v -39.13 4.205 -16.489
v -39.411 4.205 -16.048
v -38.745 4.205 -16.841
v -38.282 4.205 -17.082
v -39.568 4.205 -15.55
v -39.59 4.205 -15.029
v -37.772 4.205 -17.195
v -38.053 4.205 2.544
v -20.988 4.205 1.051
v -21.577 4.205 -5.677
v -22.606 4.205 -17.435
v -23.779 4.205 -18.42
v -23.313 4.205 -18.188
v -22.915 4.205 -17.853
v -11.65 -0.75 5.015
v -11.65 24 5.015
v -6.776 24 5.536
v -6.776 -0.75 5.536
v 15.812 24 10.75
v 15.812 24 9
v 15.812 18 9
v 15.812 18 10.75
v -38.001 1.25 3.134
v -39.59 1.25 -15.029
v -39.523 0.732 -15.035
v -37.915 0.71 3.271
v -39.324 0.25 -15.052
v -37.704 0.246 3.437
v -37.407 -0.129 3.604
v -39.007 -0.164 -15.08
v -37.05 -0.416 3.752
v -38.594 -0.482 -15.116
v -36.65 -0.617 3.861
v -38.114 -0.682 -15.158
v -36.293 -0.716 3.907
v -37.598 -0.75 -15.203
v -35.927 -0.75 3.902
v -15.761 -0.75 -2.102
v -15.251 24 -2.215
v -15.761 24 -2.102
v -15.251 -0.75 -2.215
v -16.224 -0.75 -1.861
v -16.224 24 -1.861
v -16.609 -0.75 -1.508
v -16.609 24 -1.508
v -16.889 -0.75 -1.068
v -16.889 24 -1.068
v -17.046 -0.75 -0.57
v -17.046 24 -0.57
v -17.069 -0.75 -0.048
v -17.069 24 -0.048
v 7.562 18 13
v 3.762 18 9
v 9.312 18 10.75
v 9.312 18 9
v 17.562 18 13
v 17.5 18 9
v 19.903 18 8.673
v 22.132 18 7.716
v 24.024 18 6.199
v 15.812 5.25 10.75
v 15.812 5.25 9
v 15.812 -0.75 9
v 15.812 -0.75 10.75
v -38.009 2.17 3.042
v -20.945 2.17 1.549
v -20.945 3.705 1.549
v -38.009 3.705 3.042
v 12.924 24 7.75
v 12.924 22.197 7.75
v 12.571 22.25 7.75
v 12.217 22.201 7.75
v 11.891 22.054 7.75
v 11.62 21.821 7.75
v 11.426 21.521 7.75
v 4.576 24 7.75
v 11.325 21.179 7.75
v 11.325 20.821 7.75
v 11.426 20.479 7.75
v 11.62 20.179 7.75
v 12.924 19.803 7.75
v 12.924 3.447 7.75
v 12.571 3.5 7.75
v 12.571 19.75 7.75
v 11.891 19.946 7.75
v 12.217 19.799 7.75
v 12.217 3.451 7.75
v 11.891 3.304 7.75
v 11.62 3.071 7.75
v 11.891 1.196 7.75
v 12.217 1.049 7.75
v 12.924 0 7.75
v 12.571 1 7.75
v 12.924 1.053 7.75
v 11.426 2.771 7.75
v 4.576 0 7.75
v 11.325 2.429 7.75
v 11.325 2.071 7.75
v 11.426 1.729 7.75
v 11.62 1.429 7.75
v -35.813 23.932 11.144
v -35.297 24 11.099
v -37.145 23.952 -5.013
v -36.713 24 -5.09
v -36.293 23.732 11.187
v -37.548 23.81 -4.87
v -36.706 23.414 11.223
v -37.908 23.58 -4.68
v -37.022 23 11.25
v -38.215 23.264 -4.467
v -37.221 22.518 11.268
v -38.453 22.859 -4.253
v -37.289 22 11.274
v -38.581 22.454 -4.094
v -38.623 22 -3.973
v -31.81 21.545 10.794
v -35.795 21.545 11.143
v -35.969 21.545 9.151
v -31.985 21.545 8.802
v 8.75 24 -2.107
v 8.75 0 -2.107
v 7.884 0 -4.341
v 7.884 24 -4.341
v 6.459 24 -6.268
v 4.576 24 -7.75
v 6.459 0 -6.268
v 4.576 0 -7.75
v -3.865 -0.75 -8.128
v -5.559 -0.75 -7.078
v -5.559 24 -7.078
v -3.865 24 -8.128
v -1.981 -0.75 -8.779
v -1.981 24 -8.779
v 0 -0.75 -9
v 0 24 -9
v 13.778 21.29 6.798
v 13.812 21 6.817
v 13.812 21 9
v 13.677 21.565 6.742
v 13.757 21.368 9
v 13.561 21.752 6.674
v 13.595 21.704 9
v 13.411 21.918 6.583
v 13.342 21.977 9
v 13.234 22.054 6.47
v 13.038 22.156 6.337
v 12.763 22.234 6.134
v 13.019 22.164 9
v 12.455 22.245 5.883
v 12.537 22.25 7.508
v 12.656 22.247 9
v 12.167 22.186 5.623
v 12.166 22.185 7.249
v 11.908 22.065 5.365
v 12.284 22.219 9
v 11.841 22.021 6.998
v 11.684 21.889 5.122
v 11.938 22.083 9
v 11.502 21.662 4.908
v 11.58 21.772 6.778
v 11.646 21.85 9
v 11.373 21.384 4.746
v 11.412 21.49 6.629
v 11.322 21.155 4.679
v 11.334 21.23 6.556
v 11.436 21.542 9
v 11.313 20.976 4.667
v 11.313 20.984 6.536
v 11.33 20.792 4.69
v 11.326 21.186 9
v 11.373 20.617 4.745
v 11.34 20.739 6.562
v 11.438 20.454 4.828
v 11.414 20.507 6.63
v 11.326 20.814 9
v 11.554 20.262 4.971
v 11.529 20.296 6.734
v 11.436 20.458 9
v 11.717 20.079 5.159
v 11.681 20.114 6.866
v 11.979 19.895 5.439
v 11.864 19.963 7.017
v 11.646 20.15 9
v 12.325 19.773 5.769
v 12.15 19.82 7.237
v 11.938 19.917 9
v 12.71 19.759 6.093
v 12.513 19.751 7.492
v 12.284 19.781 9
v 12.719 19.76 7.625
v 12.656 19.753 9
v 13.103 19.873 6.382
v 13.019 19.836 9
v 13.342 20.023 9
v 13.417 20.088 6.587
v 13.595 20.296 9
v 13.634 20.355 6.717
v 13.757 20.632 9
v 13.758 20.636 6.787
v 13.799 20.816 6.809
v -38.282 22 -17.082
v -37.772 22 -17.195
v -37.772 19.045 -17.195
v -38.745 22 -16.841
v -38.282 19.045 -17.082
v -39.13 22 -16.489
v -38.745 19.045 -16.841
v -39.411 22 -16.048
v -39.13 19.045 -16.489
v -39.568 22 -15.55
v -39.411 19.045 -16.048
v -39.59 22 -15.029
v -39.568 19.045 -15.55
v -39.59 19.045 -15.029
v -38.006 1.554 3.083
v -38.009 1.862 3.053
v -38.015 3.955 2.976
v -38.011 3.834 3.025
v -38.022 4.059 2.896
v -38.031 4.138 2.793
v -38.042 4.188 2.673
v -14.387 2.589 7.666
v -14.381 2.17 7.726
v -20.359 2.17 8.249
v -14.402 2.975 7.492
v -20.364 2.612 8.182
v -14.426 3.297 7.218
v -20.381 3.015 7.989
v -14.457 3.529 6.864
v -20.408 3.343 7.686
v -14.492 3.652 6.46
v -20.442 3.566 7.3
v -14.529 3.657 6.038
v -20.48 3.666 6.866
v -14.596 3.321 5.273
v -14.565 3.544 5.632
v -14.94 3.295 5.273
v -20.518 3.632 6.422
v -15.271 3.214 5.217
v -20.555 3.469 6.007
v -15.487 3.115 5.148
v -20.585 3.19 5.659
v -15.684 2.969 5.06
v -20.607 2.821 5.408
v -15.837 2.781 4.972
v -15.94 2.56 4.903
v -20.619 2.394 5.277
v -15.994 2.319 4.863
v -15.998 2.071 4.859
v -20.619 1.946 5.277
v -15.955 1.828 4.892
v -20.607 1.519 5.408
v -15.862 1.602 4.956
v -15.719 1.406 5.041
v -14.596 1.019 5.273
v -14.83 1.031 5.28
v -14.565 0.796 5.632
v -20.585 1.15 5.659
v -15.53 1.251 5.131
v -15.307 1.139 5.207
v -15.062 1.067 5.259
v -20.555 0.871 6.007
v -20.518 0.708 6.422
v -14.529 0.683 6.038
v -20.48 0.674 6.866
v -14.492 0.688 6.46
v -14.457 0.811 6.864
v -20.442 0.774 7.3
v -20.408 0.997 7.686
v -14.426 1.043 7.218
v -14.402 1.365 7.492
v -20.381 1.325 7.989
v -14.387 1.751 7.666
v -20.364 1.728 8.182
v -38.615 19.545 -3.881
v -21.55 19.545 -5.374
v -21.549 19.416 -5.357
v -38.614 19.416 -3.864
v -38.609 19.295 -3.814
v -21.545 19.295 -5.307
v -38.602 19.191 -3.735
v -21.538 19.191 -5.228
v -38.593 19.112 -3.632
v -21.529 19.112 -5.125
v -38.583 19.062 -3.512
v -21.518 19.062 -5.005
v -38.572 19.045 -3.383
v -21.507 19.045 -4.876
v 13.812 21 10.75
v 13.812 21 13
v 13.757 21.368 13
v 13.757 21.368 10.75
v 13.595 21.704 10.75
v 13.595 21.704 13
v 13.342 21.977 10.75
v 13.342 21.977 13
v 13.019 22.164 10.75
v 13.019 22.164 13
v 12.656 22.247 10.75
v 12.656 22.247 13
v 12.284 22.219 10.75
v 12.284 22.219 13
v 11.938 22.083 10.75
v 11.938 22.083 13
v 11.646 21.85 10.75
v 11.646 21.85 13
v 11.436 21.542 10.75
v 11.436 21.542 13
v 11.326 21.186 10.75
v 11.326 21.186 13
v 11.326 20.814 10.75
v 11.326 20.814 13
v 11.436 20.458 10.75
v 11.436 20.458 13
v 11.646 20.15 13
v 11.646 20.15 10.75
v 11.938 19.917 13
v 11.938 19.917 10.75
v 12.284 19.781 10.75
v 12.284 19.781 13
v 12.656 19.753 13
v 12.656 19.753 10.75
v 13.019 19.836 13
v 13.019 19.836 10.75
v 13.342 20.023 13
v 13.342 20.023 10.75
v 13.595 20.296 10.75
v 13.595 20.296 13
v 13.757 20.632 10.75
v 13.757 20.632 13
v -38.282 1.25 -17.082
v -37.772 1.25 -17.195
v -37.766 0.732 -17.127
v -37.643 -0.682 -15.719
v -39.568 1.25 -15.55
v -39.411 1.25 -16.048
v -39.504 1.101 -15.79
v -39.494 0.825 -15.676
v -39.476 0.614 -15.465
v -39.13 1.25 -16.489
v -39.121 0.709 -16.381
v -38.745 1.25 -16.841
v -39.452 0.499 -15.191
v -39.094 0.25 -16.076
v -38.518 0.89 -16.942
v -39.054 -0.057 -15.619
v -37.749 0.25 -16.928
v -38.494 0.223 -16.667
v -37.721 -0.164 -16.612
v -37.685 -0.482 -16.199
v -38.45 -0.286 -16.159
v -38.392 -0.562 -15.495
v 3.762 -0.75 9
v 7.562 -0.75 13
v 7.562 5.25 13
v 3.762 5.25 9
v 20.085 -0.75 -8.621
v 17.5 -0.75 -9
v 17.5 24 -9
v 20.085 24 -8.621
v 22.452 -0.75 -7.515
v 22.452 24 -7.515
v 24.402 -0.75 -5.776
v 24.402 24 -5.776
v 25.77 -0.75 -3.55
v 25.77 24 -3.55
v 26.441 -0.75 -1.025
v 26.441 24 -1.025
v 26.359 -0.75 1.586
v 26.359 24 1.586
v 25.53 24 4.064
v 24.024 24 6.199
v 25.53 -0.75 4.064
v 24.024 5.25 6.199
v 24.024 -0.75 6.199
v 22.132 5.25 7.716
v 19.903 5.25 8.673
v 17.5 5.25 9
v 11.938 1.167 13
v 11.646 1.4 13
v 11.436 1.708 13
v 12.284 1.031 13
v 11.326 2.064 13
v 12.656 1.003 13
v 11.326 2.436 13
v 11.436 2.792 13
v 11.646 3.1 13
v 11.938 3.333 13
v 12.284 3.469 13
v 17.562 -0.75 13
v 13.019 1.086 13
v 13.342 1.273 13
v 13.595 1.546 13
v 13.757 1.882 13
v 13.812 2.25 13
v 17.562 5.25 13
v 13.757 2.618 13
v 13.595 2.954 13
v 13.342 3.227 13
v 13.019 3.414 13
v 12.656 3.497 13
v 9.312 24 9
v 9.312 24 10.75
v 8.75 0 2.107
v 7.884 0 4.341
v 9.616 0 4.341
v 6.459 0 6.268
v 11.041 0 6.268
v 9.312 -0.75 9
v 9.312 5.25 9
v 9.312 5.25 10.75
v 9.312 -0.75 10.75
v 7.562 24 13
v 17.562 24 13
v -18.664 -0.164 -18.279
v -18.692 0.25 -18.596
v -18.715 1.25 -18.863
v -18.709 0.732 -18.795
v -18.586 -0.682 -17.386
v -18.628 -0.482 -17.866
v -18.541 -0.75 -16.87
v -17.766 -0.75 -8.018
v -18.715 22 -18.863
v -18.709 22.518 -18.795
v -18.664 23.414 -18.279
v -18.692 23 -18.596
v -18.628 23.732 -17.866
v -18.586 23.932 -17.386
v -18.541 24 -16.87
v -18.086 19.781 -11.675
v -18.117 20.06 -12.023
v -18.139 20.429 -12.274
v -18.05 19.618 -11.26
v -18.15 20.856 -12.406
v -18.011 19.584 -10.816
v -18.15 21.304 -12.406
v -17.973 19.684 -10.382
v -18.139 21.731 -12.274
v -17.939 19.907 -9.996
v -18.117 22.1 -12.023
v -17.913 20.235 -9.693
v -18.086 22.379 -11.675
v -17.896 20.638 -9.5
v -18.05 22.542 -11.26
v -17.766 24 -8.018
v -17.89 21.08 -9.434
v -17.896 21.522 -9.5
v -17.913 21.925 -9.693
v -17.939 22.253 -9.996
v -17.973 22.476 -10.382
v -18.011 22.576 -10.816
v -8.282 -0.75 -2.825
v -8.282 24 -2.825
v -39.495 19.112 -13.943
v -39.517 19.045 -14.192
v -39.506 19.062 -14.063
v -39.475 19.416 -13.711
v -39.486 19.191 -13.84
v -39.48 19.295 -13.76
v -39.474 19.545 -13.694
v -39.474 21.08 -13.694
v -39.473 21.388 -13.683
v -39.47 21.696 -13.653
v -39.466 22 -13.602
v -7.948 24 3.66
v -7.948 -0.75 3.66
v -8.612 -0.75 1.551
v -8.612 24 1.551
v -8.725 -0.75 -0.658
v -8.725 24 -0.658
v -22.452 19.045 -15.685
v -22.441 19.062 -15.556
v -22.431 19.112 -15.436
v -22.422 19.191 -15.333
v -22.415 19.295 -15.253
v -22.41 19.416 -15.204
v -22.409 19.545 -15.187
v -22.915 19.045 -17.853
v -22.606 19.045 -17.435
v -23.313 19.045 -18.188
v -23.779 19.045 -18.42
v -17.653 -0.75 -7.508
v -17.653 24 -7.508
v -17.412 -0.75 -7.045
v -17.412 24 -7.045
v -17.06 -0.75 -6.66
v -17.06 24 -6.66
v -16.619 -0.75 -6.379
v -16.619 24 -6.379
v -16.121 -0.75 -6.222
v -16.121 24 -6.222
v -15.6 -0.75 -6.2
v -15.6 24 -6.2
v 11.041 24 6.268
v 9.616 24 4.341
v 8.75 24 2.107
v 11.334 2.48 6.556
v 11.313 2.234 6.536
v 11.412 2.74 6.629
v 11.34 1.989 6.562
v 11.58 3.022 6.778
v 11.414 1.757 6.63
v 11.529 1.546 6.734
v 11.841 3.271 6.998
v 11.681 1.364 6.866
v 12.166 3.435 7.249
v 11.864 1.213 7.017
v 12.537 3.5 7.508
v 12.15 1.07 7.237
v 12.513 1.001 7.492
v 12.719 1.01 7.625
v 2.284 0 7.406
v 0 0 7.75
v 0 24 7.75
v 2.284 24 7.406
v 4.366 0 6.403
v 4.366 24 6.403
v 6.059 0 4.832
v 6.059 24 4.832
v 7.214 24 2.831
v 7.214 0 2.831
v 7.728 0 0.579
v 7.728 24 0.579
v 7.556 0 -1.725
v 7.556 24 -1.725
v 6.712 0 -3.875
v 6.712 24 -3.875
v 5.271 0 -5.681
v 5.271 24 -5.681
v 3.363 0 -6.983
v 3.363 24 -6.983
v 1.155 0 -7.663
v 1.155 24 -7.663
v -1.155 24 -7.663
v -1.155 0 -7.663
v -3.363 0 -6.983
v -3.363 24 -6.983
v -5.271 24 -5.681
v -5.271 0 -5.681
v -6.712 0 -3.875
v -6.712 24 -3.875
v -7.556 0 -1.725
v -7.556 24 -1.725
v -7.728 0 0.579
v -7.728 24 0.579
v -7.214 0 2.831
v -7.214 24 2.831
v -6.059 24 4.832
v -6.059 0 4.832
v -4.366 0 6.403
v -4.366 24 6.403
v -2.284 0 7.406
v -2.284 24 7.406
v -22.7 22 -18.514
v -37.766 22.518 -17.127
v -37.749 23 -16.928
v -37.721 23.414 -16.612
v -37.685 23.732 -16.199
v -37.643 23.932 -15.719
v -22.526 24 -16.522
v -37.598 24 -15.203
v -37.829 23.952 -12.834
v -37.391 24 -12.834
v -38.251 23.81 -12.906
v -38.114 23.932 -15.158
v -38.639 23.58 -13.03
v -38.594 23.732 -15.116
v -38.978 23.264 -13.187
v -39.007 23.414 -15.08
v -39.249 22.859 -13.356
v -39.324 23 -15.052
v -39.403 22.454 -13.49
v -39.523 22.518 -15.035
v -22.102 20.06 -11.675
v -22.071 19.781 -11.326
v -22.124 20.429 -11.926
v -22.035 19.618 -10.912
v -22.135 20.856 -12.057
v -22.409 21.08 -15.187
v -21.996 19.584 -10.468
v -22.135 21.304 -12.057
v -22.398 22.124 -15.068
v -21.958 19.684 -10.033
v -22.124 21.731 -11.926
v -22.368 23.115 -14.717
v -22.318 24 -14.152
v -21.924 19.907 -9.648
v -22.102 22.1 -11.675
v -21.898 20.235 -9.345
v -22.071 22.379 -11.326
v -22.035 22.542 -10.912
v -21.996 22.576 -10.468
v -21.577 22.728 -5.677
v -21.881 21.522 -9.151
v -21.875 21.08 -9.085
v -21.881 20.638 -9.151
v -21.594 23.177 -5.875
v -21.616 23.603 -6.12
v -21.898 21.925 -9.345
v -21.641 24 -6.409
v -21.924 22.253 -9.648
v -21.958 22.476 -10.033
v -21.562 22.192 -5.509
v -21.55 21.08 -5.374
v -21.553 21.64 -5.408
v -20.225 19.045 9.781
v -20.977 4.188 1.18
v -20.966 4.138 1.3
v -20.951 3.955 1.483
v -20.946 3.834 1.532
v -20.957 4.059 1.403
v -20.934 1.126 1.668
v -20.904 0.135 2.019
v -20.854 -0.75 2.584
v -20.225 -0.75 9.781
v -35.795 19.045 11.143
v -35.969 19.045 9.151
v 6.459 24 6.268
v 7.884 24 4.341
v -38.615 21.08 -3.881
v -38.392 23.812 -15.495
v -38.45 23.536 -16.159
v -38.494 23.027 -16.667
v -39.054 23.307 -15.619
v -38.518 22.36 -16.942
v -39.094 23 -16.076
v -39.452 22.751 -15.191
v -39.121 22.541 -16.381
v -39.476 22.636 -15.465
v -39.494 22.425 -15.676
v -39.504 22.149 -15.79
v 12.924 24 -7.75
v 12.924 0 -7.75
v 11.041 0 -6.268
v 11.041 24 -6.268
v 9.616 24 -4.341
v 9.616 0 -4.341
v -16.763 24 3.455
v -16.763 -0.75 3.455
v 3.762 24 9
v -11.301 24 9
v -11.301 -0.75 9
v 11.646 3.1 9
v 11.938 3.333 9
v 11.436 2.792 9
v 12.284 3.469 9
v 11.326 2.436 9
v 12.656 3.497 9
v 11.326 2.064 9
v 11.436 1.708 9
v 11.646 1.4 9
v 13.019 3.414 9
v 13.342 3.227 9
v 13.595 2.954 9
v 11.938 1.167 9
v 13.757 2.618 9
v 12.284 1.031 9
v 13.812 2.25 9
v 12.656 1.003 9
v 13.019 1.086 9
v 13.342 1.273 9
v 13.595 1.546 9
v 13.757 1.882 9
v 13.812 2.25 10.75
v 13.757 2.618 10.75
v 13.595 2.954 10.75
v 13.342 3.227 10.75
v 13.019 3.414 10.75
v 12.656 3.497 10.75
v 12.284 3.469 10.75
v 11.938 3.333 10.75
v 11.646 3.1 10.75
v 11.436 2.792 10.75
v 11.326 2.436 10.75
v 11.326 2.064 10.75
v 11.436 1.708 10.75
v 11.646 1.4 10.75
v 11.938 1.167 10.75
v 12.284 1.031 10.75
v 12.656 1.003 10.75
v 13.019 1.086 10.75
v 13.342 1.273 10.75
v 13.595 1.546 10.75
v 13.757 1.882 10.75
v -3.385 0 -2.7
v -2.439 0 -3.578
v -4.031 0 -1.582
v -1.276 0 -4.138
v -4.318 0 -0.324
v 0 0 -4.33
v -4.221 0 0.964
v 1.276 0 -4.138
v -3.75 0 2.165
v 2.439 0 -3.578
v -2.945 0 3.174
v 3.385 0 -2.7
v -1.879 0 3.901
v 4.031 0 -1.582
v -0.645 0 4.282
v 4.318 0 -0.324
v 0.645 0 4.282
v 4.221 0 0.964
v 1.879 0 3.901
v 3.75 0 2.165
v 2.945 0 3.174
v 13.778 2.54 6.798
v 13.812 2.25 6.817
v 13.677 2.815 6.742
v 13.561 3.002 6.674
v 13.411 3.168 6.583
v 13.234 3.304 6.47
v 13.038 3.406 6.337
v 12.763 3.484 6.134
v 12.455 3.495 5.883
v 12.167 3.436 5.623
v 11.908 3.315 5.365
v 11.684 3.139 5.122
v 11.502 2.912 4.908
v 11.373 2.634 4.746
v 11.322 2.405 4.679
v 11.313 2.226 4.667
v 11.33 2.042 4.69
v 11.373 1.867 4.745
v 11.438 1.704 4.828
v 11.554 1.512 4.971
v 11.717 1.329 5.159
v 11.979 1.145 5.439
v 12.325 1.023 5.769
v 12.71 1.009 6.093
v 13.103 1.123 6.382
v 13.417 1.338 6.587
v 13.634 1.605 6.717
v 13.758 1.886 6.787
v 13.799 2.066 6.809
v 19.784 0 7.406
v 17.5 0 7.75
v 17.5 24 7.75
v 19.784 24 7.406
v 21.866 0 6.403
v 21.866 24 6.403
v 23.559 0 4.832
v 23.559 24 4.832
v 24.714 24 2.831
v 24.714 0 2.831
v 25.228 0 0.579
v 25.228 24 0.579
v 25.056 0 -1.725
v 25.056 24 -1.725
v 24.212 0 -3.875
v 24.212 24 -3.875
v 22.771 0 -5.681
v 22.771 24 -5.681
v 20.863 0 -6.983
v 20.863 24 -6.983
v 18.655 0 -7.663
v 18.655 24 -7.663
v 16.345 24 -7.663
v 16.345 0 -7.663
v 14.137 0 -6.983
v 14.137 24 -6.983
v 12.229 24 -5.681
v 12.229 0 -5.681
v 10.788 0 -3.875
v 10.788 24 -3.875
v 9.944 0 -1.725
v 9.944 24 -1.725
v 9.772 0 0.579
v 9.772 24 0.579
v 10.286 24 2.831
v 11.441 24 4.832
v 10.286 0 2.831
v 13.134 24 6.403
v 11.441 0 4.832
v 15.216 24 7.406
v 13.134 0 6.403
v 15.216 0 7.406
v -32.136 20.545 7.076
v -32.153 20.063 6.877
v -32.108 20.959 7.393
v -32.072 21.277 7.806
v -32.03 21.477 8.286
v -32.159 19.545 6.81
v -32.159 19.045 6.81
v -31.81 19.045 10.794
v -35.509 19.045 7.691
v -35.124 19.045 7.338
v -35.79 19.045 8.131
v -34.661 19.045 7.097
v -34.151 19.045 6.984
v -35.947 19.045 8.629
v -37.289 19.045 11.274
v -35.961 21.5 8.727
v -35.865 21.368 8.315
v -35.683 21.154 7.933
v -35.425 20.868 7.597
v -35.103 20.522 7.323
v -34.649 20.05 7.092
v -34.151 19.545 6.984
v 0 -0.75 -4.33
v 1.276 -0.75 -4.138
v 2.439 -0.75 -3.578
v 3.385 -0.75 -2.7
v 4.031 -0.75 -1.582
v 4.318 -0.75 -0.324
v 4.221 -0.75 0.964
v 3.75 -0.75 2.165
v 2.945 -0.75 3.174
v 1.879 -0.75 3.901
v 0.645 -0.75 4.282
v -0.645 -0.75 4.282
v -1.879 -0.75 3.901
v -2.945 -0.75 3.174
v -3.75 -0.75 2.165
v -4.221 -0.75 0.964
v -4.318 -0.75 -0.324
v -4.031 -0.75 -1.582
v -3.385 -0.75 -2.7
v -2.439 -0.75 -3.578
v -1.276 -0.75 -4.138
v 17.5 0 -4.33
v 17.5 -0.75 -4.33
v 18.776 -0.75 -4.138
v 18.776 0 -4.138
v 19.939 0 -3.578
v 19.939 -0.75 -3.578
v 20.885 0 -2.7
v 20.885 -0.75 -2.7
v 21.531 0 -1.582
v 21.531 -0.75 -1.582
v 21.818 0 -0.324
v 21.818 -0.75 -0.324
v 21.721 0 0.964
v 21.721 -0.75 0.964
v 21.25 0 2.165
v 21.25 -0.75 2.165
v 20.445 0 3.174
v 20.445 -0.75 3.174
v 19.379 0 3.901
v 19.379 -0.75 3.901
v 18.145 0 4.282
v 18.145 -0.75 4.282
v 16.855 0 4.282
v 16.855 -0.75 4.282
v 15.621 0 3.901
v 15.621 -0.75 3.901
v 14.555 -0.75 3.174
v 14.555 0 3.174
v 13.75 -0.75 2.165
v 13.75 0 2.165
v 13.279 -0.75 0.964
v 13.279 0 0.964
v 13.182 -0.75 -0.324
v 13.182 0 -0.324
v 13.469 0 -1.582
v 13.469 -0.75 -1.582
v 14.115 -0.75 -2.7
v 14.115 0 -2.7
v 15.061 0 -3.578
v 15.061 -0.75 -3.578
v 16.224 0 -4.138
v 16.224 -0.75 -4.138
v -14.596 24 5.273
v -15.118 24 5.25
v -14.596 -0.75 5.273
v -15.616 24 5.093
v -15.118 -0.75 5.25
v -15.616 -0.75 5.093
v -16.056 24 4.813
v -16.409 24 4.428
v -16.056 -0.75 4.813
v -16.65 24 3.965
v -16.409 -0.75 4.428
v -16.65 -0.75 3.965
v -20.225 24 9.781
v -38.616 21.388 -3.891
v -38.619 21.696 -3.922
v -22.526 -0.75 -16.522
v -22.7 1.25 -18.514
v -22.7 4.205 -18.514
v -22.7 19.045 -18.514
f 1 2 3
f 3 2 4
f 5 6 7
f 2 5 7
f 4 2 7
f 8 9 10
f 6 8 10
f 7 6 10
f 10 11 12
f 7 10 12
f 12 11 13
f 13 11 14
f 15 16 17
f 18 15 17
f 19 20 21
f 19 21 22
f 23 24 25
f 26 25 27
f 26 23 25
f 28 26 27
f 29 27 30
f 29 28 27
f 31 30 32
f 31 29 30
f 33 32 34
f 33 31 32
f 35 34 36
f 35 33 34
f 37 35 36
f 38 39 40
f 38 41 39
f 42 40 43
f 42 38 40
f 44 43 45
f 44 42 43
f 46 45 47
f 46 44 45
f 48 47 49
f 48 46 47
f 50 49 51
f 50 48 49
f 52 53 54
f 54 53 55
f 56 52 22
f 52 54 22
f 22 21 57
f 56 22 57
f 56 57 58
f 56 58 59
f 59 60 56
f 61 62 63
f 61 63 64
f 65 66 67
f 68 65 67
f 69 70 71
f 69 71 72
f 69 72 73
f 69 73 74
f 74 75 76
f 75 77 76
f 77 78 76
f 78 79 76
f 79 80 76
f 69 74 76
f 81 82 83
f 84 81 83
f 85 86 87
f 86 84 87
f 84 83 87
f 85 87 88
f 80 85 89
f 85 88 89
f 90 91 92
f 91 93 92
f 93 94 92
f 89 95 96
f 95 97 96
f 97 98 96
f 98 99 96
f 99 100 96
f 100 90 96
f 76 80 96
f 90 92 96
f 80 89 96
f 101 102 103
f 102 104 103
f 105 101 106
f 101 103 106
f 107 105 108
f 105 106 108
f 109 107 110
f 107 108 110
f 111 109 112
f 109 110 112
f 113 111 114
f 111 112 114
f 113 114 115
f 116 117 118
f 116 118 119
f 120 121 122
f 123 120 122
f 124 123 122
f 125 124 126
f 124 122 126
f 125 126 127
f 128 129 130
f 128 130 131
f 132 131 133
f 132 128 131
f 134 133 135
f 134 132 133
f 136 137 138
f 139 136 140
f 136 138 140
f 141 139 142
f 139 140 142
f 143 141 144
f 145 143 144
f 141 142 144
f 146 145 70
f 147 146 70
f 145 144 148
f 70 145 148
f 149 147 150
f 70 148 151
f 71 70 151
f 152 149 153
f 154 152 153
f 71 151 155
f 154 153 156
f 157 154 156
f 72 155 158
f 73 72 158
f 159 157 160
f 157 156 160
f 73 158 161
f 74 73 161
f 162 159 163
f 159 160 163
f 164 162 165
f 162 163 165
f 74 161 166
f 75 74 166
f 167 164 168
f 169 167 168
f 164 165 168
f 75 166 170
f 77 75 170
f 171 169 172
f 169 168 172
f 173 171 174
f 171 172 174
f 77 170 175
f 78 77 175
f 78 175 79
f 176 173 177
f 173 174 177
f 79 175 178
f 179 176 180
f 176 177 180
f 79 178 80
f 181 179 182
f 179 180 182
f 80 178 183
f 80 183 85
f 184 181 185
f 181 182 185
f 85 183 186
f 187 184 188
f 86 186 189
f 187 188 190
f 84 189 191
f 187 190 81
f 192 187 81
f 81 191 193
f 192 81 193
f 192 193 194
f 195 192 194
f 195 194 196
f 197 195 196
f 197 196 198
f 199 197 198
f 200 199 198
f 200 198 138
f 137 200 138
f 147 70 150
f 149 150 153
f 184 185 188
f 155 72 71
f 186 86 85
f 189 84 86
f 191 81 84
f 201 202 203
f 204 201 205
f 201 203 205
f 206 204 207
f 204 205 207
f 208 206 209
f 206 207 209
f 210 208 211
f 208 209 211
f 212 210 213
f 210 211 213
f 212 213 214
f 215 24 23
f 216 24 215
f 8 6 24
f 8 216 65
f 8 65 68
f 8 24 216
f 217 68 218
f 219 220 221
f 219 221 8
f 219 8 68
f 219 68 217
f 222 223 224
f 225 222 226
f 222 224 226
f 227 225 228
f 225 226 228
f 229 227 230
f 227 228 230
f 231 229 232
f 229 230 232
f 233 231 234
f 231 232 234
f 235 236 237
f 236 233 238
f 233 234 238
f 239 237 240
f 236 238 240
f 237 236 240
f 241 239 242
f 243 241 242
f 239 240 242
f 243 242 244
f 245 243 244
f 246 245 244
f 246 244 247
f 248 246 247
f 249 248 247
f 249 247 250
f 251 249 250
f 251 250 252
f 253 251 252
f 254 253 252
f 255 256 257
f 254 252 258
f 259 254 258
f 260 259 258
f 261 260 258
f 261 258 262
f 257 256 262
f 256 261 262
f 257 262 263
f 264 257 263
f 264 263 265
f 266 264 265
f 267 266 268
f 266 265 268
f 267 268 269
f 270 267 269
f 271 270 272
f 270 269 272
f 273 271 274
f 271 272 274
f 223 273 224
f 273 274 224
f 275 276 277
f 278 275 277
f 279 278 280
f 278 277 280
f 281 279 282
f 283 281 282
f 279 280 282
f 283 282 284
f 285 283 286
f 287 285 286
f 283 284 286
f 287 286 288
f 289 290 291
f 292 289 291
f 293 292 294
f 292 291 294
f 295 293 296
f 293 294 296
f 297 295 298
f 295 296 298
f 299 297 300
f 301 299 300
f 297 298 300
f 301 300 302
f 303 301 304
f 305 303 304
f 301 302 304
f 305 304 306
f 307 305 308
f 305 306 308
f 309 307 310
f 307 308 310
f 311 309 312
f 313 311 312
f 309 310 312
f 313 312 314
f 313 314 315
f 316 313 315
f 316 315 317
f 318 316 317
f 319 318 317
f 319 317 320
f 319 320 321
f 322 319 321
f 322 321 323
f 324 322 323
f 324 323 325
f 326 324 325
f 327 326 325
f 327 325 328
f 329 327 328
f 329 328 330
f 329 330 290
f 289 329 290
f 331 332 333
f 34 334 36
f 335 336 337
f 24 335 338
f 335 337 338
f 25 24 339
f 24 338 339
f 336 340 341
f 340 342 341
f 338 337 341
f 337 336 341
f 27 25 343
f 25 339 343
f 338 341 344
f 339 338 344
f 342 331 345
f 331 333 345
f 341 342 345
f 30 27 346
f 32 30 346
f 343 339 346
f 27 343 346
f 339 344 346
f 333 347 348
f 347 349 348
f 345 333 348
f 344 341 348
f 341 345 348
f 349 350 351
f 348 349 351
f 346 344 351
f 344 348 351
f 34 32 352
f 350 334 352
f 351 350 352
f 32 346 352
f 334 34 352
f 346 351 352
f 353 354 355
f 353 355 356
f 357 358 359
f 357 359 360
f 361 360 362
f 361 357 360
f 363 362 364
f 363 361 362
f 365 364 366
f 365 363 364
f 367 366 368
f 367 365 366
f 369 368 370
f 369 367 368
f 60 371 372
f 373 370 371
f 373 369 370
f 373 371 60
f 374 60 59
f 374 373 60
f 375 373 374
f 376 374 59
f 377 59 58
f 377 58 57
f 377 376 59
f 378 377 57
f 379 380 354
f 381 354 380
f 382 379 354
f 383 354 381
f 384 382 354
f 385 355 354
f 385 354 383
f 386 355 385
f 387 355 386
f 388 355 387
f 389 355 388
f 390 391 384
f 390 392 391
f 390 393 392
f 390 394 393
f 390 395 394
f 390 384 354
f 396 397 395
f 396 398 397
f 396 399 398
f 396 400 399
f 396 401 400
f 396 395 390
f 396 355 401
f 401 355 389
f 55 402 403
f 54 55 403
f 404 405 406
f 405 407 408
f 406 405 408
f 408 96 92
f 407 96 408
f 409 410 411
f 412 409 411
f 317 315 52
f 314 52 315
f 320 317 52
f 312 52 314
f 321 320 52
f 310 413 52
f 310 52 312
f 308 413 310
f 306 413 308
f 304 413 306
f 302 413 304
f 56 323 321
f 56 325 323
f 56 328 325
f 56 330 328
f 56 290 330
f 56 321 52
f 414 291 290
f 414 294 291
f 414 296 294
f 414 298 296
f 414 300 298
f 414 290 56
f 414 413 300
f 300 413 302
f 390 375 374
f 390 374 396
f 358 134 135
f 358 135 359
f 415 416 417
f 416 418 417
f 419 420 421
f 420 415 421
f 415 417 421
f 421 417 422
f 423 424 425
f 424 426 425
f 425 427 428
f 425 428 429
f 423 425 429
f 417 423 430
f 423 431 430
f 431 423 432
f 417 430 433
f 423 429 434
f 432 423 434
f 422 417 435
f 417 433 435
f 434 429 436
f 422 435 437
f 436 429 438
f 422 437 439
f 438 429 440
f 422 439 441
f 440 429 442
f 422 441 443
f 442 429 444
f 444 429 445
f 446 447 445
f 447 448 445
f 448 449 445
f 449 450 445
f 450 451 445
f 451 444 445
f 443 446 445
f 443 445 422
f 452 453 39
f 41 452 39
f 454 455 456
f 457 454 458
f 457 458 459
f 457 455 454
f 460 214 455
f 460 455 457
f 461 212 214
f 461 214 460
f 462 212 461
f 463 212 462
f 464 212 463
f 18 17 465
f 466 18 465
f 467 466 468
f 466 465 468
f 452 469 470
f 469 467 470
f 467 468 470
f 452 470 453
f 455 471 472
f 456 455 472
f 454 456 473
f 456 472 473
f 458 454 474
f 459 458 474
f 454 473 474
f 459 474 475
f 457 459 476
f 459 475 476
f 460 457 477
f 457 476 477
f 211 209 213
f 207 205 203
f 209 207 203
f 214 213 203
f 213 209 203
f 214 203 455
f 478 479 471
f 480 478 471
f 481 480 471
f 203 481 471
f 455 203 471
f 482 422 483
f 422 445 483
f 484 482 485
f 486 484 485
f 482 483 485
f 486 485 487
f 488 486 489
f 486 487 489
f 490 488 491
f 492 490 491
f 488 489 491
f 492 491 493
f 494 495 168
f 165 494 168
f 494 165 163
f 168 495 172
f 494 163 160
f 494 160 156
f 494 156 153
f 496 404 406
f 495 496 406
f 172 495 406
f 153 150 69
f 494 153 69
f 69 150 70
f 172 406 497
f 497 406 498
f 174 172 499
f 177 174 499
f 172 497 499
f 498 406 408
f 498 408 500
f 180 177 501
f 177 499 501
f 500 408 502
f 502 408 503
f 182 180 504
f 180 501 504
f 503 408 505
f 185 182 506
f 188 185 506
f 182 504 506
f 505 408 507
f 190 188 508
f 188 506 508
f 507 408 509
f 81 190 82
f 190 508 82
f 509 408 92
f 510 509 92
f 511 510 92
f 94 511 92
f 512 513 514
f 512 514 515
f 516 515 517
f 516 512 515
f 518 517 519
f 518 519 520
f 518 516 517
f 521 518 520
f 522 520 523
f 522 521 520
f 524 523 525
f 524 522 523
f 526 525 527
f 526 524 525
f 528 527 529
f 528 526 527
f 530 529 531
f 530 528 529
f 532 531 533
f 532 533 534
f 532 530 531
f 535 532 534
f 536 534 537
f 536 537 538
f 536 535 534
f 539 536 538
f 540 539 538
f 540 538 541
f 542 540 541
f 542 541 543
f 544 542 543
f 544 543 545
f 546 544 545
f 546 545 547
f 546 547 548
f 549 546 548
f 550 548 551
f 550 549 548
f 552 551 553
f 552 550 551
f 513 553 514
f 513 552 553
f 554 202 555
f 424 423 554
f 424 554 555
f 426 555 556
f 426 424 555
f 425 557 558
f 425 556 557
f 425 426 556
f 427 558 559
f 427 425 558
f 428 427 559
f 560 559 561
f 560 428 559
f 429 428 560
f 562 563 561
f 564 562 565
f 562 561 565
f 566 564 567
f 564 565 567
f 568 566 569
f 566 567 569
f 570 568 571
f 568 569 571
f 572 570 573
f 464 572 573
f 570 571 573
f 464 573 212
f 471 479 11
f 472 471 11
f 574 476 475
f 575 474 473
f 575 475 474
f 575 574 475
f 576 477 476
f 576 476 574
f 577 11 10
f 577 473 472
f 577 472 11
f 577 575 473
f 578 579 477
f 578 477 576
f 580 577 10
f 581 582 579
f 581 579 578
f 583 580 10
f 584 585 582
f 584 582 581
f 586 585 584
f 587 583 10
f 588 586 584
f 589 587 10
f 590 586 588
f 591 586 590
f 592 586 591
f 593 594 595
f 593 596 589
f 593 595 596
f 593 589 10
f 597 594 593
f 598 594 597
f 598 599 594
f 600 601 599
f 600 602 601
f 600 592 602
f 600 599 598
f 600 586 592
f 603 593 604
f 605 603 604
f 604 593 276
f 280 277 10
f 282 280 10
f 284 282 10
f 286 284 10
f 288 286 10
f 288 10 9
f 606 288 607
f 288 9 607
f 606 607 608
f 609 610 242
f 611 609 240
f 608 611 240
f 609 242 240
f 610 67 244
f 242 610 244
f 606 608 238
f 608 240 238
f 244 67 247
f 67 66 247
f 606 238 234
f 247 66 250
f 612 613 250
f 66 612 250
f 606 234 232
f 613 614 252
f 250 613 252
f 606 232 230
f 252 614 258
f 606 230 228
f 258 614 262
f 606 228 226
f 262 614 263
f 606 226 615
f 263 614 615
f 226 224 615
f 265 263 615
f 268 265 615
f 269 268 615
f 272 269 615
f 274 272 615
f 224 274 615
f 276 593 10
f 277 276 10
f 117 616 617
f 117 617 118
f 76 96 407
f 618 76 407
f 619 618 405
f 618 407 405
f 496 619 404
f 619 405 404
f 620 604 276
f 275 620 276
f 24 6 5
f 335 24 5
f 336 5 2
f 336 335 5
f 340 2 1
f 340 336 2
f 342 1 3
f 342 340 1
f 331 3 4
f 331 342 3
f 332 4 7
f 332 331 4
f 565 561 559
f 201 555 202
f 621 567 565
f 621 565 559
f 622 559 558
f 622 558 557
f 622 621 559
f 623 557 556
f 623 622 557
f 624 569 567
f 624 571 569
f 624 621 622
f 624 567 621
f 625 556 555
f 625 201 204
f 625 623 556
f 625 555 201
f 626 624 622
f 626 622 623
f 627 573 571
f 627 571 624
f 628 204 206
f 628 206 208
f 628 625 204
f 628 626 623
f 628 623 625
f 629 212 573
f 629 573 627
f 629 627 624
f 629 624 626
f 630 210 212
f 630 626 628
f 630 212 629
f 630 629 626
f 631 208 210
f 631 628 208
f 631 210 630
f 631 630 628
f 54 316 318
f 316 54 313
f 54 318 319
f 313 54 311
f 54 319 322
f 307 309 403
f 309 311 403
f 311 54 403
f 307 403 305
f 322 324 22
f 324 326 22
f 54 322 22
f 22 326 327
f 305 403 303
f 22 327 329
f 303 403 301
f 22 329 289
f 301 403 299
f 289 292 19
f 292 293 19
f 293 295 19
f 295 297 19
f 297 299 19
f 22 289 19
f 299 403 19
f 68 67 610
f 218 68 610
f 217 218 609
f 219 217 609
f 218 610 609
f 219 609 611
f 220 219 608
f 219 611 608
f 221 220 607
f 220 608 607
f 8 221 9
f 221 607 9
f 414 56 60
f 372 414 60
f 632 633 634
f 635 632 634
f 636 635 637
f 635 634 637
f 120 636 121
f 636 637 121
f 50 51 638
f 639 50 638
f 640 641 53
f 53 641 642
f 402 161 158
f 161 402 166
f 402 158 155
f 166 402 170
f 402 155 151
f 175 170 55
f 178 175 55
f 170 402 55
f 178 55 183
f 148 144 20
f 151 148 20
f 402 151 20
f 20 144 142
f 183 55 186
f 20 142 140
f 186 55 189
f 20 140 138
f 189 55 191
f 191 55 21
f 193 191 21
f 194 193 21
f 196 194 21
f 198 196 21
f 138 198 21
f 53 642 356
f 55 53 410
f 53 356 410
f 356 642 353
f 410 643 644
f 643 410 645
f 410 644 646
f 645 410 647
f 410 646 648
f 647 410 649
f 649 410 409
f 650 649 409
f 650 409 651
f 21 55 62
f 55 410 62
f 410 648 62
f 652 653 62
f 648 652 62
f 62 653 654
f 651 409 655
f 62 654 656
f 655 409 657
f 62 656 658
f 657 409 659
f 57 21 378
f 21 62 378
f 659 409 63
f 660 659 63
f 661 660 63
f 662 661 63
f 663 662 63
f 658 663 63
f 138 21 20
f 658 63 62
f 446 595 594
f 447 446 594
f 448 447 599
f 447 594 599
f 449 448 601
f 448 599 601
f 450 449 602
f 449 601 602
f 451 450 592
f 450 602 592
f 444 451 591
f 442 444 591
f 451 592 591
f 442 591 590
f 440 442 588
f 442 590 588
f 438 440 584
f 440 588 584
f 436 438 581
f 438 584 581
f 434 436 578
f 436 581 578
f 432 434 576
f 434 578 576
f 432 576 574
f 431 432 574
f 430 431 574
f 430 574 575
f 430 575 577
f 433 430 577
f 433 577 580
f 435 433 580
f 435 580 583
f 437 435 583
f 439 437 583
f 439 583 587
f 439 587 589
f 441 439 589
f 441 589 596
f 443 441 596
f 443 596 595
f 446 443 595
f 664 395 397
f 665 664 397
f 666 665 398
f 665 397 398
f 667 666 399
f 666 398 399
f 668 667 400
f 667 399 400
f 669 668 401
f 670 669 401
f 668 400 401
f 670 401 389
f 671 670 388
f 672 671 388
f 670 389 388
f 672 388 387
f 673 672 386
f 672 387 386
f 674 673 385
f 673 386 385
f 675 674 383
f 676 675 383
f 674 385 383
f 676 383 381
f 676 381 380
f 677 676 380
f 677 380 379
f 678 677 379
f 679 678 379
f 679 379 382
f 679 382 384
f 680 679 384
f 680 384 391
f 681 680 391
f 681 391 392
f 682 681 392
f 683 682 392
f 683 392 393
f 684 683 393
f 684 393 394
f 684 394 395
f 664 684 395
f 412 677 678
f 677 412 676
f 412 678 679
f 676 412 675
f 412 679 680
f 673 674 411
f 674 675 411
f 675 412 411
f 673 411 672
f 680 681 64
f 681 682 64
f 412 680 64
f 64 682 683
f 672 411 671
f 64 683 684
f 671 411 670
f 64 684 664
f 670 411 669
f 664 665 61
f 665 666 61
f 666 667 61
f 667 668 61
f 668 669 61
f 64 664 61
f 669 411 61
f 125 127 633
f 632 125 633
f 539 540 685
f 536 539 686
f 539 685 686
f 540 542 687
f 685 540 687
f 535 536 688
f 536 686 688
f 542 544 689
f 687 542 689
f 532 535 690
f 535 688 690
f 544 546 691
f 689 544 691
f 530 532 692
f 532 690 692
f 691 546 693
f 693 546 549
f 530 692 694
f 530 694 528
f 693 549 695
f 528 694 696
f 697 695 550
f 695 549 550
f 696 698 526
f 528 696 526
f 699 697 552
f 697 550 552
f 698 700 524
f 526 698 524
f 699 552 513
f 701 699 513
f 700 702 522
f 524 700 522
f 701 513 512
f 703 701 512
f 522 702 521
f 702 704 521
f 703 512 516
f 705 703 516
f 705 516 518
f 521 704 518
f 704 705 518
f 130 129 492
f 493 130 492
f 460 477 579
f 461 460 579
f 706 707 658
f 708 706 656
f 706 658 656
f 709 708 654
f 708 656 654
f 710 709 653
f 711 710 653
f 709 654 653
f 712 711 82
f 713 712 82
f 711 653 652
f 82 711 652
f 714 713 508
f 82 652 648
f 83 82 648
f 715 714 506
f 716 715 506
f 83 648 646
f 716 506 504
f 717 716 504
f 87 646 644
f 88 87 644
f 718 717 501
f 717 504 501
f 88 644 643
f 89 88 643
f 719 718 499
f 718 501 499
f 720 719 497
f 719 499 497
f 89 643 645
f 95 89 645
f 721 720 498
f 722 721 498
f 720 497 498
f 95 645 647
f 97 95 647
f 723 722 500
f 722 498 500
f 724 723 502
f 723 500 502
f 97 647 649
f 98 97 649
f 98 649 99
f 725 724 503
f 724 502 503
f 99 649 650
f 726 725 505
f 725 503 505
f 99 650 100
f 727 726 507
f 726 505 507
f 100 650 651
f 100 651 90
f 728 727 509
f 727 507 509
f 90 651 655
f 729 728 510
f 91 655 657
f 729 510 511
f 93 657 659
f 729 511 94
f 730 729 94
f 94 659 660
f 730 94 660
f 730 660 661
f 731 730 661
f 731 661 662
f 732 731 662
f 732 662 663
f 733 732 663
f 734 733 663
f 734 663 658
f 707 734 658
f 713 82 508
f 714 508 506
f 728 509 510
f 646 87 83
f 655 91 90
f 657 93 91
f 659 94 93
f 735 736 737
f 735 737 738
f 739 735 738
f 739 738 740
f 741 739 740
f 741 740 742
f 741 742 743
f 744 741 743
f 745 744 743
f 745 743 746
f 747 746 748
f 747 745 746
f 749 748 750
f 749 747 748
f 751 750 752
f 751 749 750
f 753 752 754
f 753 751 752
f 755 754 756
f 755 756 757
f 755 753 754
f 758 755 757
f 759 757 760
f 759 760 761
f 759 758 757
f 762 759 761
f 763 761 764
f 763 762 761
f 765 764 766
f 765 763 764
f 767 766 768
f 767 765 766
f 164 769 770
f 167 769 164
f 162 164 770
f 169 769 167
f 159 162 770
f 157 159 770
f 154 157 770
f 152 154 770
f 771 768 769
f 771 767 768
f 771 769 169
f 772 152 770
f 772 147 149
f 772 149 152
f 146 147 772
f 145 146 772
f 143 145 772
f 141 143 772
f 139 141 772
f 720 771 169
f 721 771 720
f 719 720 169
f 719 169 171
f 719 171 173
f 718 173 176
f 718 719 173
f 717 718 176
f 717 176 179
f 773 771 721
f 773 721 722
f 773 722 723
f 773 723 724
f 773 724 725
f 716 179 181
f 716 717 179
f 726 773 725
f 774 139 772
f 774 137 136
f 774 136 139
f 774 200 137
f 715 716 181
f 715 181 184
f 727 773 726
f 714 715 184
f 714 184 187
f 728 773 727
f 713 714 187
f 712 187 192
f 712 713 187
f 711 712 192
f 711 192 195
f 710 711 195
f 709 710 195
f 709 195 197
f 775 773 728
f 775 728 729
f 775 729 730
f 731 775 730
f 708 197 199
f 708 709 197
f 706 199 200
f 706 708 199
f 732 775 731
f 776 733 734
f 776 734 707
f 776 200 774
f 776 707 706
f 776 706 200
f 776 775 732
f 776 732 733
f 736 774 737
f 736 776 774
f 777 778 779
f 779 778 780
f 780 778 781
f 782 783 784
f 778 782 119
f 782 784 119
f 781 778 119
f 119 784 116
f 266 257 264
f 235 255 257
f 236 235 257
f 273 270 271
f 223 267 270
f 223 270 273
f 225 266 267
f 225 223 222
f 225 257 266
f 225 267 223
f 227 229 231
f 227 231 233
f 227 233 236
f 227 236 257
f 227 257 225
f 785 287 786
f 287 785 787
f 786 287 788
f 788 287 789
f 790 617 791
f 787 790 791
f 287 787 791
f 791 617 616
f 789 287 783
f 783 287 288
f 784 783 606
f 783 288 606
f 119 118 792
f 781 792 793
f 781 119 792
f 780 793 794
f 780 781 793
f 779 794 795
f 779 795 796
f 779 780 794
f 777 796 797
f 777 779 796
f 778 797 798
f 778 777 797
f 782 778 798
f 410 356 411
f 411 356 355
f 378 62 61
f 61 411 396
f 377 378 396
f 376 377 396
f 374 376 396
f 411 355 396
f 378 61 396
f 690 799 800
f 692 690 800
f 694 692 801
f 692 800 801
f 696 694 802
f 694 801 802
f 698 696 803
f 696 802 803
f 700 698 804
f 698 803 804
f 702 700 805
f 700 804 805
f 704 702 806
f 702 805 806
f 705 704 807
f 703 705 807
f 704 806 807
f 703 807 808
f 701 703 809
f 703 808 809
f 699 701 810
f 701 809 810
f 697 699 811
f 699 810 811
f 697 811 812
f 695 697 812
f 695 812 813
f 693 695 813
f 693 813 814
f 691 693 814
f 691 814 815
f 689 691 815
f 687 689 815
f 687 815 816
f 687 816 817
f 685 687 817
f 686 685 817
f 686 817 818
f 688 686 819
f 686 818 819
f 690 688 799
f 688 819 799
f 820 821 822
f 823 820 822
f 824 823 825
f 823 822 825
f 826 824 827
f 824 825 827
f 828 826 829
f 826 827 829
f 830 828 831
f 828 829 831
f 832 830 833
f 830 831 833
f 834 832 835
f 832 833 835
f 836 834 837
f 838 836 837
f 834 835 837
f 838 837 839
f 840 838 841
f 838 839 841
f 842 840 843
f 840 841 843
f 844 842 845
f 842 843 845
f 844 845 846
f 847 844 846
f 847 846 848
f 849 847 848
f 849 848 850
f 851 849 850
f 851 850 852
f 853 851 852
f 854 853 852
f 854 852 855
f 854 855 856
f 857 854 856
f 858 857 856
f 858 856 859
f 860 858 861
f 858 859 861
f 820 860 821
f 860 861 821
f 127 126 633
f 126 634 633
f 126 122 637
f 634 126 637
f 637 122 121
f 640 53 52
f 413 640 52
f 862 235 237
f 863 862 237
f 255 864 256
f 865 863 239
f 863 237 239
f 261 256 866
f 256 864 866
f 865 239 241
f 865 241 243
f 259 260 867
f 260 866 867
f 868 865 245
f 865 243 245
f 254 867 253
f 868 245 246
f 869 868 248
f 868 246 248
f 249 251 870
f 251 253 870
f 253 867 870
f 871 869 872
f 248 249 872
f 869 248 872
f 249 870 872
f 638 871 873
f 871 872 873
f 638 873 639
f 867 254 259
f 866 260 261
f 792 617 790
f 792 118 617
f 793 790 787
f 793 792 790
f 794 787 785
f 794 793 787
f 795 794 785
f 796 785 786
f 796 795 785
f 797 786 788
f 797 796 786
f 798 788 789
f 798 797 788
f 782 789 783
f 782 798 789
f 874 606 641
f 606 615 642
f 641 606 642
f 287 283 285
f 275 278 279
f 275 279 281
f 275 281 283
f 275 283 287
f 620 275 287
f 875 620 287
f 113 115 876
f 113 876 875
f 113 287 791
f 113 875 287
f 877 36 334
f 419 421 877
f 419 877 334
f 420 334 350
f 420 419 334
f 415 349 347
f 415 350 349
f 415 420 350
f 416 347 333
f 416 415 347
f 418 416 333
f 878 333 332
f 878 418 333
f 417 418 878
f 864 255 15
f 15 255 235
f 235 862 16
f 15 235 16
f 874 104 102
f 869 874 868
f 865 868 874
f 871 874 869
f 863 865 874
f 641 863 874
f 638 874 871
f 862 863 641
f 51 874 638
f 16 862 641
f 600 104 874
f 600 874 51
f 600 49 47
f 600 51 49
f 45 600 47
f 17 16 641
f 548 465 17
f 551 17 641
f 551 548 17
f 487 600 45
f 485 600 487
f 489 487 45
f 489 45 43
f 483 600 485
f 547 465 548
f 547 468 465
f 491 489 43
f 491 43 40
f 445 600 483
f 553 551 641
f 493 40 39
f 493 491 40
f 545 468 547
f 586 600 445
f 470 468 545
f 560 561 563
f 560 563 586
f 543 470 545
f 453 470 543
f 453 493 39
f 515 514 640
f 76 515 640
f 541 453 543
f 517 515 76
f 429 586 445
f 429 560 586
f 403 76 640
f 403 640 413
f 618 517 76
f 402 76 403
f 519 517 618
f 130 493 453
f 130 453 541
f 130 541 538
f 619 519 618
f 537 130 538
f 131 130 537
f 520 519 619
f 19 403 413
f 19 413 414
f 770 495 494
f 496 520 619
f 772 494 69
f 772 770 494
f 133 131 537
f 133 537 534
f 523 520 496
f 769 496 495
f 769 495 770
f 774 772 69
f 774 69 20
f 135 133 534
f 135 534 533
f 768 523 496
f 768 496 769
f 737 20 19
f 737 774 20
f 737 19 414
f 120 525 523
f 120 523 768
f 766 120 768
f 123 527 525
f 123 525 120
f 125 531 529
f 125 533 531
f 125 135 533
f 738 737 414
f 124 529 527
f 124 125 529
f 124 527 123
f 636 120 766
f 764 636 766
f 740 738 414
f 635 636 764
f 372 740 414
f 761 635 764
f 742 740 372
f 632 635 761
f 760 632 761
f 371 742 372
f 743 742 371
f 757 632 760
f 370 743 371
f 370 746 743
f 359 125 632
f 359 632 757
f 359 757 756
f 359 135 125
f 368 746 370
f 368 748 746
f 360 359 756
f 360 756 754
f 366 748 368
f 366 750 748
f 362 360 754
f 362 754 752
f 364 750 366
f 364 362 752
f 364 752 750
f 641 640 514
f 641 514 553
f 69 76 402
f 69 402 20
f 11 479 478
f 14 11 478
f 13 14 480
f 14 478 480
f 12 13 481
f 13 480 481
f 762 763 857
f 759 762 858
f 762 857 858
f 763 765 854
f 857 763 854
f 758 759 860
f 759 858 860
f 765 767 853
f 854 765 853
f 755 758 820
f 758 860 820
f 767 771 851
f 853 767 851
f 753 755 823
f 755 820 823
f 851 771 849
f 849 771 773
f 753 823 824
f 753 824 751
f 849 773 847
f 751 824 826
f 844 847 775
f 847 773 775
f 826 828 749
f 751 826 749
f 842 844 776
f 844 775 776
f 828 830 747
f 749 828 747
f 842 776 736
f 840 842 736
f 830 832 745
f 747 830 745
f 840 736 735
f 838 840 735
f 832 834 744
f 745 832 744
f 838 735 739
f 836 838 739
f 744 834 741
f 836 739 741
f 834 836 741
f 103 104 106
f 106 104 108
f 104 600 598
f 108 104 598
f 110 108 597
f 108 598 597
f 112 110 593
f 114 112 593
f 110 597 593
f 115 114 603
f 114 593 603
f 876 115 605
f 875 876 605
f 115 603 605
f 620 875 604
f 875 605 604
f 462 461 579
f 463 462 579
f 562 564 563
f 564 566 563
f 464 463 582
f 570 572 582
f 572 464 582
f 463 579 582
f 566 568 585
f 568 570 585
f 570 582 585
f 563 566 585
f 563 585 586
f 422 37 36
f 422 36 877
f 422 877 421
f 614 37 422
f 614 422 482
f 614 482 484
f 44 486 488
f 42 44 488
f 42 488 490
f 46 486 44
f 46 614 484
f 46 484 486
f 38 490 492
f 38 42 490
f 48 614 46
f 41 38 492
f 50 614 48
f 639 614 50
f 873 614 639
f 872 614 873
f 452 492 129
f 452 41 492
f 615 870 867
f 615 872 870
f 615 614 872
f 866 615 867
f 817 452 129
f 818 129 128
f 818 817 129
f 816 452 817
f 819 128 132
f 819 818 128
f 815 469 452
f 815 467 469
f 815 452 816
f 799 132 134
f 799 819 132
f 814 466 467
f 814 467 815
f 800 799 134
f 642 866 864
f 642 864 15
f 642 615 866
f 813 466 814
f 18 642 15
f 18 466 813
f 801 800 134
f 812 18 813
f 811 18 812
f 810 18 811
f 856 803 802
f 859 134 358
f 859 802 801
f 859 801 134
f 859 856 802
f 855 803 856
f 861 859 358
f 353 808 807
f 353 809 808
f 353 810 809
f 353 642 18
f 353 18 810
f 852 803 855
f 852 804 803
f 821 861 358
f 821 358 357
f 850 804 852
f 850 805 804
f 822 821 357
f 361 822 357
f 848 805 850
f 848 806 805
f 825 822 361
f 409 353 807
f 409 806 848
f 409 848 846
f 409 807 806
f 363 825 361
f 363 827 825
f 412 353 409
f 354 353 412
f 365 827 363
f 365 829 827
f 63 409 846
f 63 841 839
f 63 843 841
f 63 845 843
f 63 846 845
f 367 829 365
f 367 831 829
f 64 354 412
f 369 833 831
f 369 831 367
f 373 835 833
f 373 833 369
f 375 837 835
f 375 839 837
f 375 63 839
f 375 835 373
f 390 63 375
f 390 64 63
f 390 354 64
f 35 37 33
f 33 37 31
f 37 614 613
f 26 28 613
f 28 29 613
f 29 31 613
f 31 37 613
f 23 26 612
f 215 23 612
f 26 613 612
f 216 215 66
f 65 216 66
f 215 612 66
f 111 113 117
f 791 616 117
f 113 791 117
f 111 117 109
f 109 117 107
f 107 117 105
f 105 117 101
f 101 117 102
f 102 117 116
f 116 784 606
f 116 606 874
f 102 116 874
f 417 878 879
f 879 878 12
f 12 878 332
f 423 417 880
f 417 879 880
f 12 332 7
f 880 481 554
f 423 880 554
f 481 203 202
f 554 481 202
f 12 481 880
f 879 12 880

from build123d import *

# Parameters (mm, degrees)
SKETCH1_R               = 7.75
BOSS_EXTRUDE1_DEPTH     = 24
BOSS_EXTRUDE2_START     = 0.75
SKETCH2_R               = 4.33
BOSS_EXTRUDE2_DEPTH     = 0.75
SKETCH4_W               = 10
SKETCH4_H               = 6
BOSS_EXTRUDE4_DEPTH     = 4
CUT_EXTRUDE1_DEPTH      = 35.968736037
CUT_EXTRUDE1_DEPTH_BACK = 35.968736037
SKETCH5_W               = 6.5
SKETCH5_H               = 1.75
SKETCH6_R               = 1.25
CUT_EXTRUDE2_DEPTH      = 16
BOSS_EXTRUDE5_START     = -24.75
BOSS_EXTRUDE5_DEPTH     = 24.75
CUT_EXTRUDE3_DEPTH      = 39.520286863
SKETCH9_W               = 12.886425037
SKETCH9_H               = 24.75
BOSS_EXTRUDE6_DEPTH     = 4
FILLET1_R               = 2
FILLET2_R               = 2
BOSS_EXTRUDE9_DEPTH     = 17.13
SKETCH14_R              = 1.5
CUT_EXTRUDE5_DEPTH      = 6
BOSS_EXTRUDE10_DEPTH    = 14.84
FILLET4_R               = 2
SKETCH16_W              = 4
SKETCH16_H              = 2.5
CUT_EXTRUDE6_DEPTH      = 4
FILLET5_R               = 2
BOSS_EXTRUDE11_DEPTH    = 6
BOSS_EXTRUDE12_START    = -6
BOSS_EXTRUDE12_DEPTH    = 6


with BuildPart() as part:
    # Sketch1 → Boss-Extrude1 (new body)
    with BuildSketch(Plane(origin=(0, 0, 0), x_dir=(1, 0, 0), z_dir=(0, 1, 0))):
        with BuildLine():
            Line((0, -9), (17.5, -9))
            ThreePointArc((17.5, -9), (26.5, 0), (17.5, 9))
            Line((17.5, 9), (0, 9))
            ThreePointArc((0, 9), (-9, 0), (0, -9))
        make_face()
        with Locations(Location((17.5, 0, 0), (0, 0, 270))):
            Circle(SKETCH1_R, mode=Mode.SUBTRACT)
        with BuildLine():
            ThreePointArc((8.75, -2.106537443), (10.26424991, -5.352001554), (12.924248696, -7.75))
            Line((12.924248696, -7.75), (4.575751304, -7.75))
            ThreePointArc((4.575751304, -7.75), (7.23575009, -5.352001554), (8.75, -2.106537443))
        make_face(mode=Mode.SUBTRACT)
        with Locations(Location((0, 0, 0), (0, 0, 270))):
            Circle(SKETCH1_R, mode=Mode.SUBTRACT)
        with BuildLine():
            Line((4.575751304, 7.75), (12.924248696, 7.75))
            ThreePointArc((12.924248696, 7.75), (10.26424991, 5.352001554), (8.75, 2.106537443))
            ThreePointArc((8.75, 2.106537443), (7.23575009, 5.352001554), (4.575751304, 7.75))
        make_face(mode=Mode.SUBTRACT)
    extrude(amount=BOSS_EXTRUDE1_DEPTH)

    # Sketch2 → Boss-Extrude2 (add)
    with BuildSketch(Plane.XZ.offset(BOSS_EXTRUDE2_START)):
        with BuildLine():
            Line((17.5, 9), (0, 9))
            ThreePointArc((0, 9), (-9, 0), (0, -9))
            Line((0, -9), (17.5, -9))
            ThreePointArc((17.5, -9), (26.5, 0), (17.5, 9))
        make_face()
        with Locations(Location((17.5, 0, 0), (0, 0, 270))):
            Circle(SKETCH2_R, mode=Mode.SUBTRACT)
        with Locations(Location((0, 0, 0), (0, 0, 270))):
            Circle(SKETCH2_R, mode=Mode.SUBTRACT)
    extrude(amount=-BOSS_EXTRUDE2_DEPTH)

    # Sketch4 → Boss-Extrude4 (add)
    with BuildSketch(Plane.XY.offset(9)):
        with Locations((12.5625, 2.25)):
            Rectangle(SKETCH4_W, SKETCH4_H)
        with Locations((12.5625, 21)):
            Rectangle(SKETCH4_W, SKETCH4_H)
    extrude(amount=BOSS_EXTRUDE4_DEPTH)

    # Sketch5 → Cut-Extrude1 (cut, two sides: drawn at the far end of the back side and taken through both)
    with BuildSketch(Plane.XZ.offset(-18).offset(-CUT_EXTRUDE1_DEPTH_BACK)):
        with Locations((12.5625, 9.875)):
            Rectangle(SKETCH5_W, SKETCH5_H)
    extrude(amount=CUT_EXTRUDE1_DEPTH + CUT_EXTRUDE1_DEPTH_BACK, mode=Mode.SUBTRACT)

    # Sketch6 → Cut-Extrude2 (cut)
    with BuildSketch(Plane.XY.offset(13)):
        with Locations((12.5625, 2.25)):
            Circle(SKETCH6_R)
        with Locations((12.5625, 21)):
            Circle(SKETCH6_R)
    extrude(amount=-CUT_EXTRUDE2_DEPTH, mode=Mode.SUBTRACT)

    # Sketch7 → Boss-Extrude5 (add)
    with BuildSketch(Plane(origin=(0, 24, 0), x_dir=(1, 0, 0), z_dir=(0, 1, 0)).offset(BOSS_EXTRUDE5_START)):
        with BuildLine():
            Line((-20.224515403, -9.780709308), (-11.300967177, -9))
            Line((-11.300967177, -9), (0, -9))
            ThreePointArc((0, -9), (-8.505937794, -2.940922006), (-5.558955476, 7.077995056))
            Line((-5.558955476, 7.077995056), (-21.576855644, 5.676610378))
            Line((-21.576855644, 5.676610378), (-20.224515403, -9.780709308))
        make_face()
    extrude(amount=BOSS_EXTRUDE5_DEPTH)

    # Sketch8 → Cut-Extrude3 (cut, through all)
    with BuildSketch(Plane(origin=(0, 24, 0), x_dir=(1, 0, 0), z_dir=(0, 1, 0))):
        with BuildLine():
            Line((-16.588359581, -5.447307545), (-11.649590148, -5.015221208))
            Line((-11.649590148, -5.015221208), (-6.776158873, -5.535898385))
            ThreePointArc((-6.776158873, -5.535898385), (-8.611505528, -1.550636174), (-8.281582293, 2.824516725))
            Line((-8.281582293, 2.824516725), (-17.24345388, 2.040454557))
            Line((-17.24345388, 2.040454557), (-16.588359581, -5.447307545))
        make_face()
    extrude(amount=-CUT_EXTRUDE3_DEPTH, mode=Mode.SUBTRACT)

    # Sketch9 → Boss-Extrude6 (add)
    with BuildSketch(Plane(origin=(-20.92008866, 0, 1.830270598), x_dir=(0.08715574274765853, 0, 0.9961946980917455), z_dir=(-0.9961946980917455, 0, 0.08715574274765853))):
        with Locations((-13.978768561, 11.625)):
            Rectangle(SKETCH9_W, SKETCH9_H)
    extrude(amount=-BOSS_EXTRUDE6_DEPTH)

    # Fillet1
    fillet1_edges = [part.edges().sort_by_distance(p)[0] for p in [
        (-16.588359581, 11.625, 5.447307545),
        (-17.24345388, 11.625, -2.040454557),
        (-17.592076851, 11.625, -6.025233349),
    ]]
    fillet(fillet1_edges, radius=FILLET1_R)

    # Fillet2
    fillet2_edges = [part.edges().sort_by_distance(p)[0] for p in [
        (-20.707592193, -0.75, -18.688310163),
        (-20.707592193, 24, -18.688310163),
    ]]
    fillet(fillet2_edges, radius=FILLET2_R)

    # Sketch13 → Boss-Extrude9 (add)
    with BuildSketch(Plane(origin=(-20.92008866, 0, 1.830270598), x_dir=(0.08715574274765853, 0, 0.9961946980917455), z_dir=(-0.9961946980917455, 0, 0.08715574274765853))):
        with BuildLine():
            Line((-7.231981079, 21.08), (-7.231981079, 19.545))
            ThreePointArc((-7.231981079, 19.545), (-7.085534469, 19.191446609), (-6.731981079, 19.045))
            Line((-6.731981079, 19.045), (7.980808095, 19.045))
            Line((7.980808095, 19.045), (7.980808095, 24))
            Line((7.980808095, 24), (-8.270307829, 24))
            ThreePointArc((-8.270307829, 24), (-7.499287378, 22.629558198), (-7.231981079, 21.08))
        make_face()
        with BuildLine():
            Line((-20.421981079, 19.045), (-17.581981079, 19.045))
            ThreePointArc((-17.581981079, 19.045), (-17.228427688, 19.191446609), (-17.081981079, 19.545))
            Line((-17.081981079, 19.545), (-17.081981079, 21.08))
            ThreePointArc((-17.081981079, 21.08), (-16.814674779, 22.629558198), (-16.043654328, 24))
            Line((-16.043654328, 24), (-18.421981079, 24))
            ThreePointArc((-18.421981079, 24), (-19.836194641, 23.414213562), (-20.421981079, 22))
            Line((-20.421981079, 22), (-20.421981079, 19.045))
        make_face()
        with BuildLine():
            ThreePointArc((-0.281981079, 3.705), (-0.428427688, 4.058553391), (-0.781981079, 4.205))
            Line((-0.781981079, 4.205), (-20.421981079, 4.205))
            Line((-20.421981079, 4.205), (-20.421981079, 1.25))
            ThreePointArc((-20.421981079, 1.25), (-19.836194641, -0.164213562), (-18.421981079, -0.75))
            Line((-18.421981079, -0.75), (0.756345672, -0.75))
            ThreePointArc((0.756345672, -0.75), (-0.014674779, 0.620441802), (-0.281981079, 2.17))
            Line((-0.281981079, 2.17), (-0.281981079, 3.705))
        make_face()
    extrude(amount=BOSS_EXTRUDE9_DEPTH)

    # Sketch14 → Cut-Extrude5 (cut)
    with BuildSketch(Plane(origin=(-20.92008866, 0, 1.830270598), x_dir=(0.08715574274765853, 0, 0.9961946980917455), z_dir=(-0.9961946980917455, 0, 0.08715574274765853))):
        with Locations((-12.456981079, 21.08)):
            Circle(SKETCH14_R)
        with Locations((4.943018921, 2.17)):
            Circle(SKETCH14_R)
    extrude(amount=-CUT_EXTRUDE5_DEPTH, mode=Mode.SUBTRACT)

    # Sketch15 → Boss-Extrude10 (add)
    with BuildSketch(Plane.XZ.offset(-19.045)):
        with BuildLine():
            ThreePointArc((-22.605549661, -17.434636803), (-23.103926759, -18.03259557), (-23.779343463, -18.419566749))
            Line((-23.779343463, -18.419566749), (-22.699981589, -18.513998677))
            Line((-22.699981589, -18.513998677), (-22.605549661, -17.434636803))
        make_face()
    extrude(amount=BOSS_EXTRUDE10_DEPTH)

    # Fillet4
    fillet4_edges = [part.edges().sort_by_distance(p)[0] for p in [
        (-37.99751962, 24, 3.179049421),
        (-38.754734626, -0.75, -5.475957694),
        (-39.713742115, -0.164213562, -16.437463461),
        (-39.764796768, 2.7275, -17.021020804),
        (-39.764796768, 20.5225, -17.021020804),
        (-39.713742115, 23.414213562, -16.437463461),
        (-39.486842865, 24, -13.843993158),
    ]]
    fillet(fillet4_edges, radius=FILLET4_R)

    # Sketch16 → Cut-Extrude6 (cut)
    with BuildSketch(Plane(origin=(0.695573257, 0, 7.95043871), x_dir=(0.9961946980917455, 0, -0.08715574274765835), z_dir=(0.08715574274765836, 0, 0.9961946980917457))):
        with Locations((-34.63, 20.295)):
            Rectangle(SKETCH16_W, SKETCH16_H)
    extrude(amount=-CUT_EXTRUDE6_DEPTH, mode=Mode.SUBTRACT)

    # Fillet5
    fillet5_edges = [part.edges().sort_by_distance(p)[0] for p in [
        (-36.143661505, 20.295, 7.158174775),
        (-34.151272109, 21.545, 6.983863289),
    ]]
    fillet(fillet5_edges, radius=FILLET5_R)

    # Sketch17 → Boss-Extrude11 (add)
    with BuildSketch(Plane.XZ.offset(0.75)):
        Polygon((7.5625, 9), (7.5625, 13), (3.76173375, 9), align=None)
        with BuildLine():
            Line((24.024370778, 6.199402064), (17.5625, 13))
            Line((17.5625, 13), (17.5625, 9))
            Line((17.5625, 9), (17.5, 9))
            ThreePointArc((17.5, 9), (21.050026861, 8.270266579), (24.024370778, 6.199402064))
        make_face()
    extrude(amount=-BOSS_EXTRUDE11_DEPTH)

    # Sketch18 → Boss-Extrude12 (add)
    with BuildSketch(Plane(origin=(0, 24, 0), x_dir=(1, 0, 0), z_dir=(0, 1, 0)).offset(BOSS_EXTRUDE12_START)):
        with BuildLine():
            ThreePointArc((24.024370778, -6.199402064), (21.050026861, -8.270266579), (17.5, -9))
            Line((17.5, -9), (17.5625, -9))
            Line((17.5625, -9), (17.5625, -13))
            Line((17.5625, -13), (24.024370778, -6.199402064))
        make_face()
        Polygon((7.5625, -13), (7.5625, -9), (3.76173375, -9), align=None)
    extrude(amount=BOSS_EXTRUDE12_DEPTH)


solid = part.part
